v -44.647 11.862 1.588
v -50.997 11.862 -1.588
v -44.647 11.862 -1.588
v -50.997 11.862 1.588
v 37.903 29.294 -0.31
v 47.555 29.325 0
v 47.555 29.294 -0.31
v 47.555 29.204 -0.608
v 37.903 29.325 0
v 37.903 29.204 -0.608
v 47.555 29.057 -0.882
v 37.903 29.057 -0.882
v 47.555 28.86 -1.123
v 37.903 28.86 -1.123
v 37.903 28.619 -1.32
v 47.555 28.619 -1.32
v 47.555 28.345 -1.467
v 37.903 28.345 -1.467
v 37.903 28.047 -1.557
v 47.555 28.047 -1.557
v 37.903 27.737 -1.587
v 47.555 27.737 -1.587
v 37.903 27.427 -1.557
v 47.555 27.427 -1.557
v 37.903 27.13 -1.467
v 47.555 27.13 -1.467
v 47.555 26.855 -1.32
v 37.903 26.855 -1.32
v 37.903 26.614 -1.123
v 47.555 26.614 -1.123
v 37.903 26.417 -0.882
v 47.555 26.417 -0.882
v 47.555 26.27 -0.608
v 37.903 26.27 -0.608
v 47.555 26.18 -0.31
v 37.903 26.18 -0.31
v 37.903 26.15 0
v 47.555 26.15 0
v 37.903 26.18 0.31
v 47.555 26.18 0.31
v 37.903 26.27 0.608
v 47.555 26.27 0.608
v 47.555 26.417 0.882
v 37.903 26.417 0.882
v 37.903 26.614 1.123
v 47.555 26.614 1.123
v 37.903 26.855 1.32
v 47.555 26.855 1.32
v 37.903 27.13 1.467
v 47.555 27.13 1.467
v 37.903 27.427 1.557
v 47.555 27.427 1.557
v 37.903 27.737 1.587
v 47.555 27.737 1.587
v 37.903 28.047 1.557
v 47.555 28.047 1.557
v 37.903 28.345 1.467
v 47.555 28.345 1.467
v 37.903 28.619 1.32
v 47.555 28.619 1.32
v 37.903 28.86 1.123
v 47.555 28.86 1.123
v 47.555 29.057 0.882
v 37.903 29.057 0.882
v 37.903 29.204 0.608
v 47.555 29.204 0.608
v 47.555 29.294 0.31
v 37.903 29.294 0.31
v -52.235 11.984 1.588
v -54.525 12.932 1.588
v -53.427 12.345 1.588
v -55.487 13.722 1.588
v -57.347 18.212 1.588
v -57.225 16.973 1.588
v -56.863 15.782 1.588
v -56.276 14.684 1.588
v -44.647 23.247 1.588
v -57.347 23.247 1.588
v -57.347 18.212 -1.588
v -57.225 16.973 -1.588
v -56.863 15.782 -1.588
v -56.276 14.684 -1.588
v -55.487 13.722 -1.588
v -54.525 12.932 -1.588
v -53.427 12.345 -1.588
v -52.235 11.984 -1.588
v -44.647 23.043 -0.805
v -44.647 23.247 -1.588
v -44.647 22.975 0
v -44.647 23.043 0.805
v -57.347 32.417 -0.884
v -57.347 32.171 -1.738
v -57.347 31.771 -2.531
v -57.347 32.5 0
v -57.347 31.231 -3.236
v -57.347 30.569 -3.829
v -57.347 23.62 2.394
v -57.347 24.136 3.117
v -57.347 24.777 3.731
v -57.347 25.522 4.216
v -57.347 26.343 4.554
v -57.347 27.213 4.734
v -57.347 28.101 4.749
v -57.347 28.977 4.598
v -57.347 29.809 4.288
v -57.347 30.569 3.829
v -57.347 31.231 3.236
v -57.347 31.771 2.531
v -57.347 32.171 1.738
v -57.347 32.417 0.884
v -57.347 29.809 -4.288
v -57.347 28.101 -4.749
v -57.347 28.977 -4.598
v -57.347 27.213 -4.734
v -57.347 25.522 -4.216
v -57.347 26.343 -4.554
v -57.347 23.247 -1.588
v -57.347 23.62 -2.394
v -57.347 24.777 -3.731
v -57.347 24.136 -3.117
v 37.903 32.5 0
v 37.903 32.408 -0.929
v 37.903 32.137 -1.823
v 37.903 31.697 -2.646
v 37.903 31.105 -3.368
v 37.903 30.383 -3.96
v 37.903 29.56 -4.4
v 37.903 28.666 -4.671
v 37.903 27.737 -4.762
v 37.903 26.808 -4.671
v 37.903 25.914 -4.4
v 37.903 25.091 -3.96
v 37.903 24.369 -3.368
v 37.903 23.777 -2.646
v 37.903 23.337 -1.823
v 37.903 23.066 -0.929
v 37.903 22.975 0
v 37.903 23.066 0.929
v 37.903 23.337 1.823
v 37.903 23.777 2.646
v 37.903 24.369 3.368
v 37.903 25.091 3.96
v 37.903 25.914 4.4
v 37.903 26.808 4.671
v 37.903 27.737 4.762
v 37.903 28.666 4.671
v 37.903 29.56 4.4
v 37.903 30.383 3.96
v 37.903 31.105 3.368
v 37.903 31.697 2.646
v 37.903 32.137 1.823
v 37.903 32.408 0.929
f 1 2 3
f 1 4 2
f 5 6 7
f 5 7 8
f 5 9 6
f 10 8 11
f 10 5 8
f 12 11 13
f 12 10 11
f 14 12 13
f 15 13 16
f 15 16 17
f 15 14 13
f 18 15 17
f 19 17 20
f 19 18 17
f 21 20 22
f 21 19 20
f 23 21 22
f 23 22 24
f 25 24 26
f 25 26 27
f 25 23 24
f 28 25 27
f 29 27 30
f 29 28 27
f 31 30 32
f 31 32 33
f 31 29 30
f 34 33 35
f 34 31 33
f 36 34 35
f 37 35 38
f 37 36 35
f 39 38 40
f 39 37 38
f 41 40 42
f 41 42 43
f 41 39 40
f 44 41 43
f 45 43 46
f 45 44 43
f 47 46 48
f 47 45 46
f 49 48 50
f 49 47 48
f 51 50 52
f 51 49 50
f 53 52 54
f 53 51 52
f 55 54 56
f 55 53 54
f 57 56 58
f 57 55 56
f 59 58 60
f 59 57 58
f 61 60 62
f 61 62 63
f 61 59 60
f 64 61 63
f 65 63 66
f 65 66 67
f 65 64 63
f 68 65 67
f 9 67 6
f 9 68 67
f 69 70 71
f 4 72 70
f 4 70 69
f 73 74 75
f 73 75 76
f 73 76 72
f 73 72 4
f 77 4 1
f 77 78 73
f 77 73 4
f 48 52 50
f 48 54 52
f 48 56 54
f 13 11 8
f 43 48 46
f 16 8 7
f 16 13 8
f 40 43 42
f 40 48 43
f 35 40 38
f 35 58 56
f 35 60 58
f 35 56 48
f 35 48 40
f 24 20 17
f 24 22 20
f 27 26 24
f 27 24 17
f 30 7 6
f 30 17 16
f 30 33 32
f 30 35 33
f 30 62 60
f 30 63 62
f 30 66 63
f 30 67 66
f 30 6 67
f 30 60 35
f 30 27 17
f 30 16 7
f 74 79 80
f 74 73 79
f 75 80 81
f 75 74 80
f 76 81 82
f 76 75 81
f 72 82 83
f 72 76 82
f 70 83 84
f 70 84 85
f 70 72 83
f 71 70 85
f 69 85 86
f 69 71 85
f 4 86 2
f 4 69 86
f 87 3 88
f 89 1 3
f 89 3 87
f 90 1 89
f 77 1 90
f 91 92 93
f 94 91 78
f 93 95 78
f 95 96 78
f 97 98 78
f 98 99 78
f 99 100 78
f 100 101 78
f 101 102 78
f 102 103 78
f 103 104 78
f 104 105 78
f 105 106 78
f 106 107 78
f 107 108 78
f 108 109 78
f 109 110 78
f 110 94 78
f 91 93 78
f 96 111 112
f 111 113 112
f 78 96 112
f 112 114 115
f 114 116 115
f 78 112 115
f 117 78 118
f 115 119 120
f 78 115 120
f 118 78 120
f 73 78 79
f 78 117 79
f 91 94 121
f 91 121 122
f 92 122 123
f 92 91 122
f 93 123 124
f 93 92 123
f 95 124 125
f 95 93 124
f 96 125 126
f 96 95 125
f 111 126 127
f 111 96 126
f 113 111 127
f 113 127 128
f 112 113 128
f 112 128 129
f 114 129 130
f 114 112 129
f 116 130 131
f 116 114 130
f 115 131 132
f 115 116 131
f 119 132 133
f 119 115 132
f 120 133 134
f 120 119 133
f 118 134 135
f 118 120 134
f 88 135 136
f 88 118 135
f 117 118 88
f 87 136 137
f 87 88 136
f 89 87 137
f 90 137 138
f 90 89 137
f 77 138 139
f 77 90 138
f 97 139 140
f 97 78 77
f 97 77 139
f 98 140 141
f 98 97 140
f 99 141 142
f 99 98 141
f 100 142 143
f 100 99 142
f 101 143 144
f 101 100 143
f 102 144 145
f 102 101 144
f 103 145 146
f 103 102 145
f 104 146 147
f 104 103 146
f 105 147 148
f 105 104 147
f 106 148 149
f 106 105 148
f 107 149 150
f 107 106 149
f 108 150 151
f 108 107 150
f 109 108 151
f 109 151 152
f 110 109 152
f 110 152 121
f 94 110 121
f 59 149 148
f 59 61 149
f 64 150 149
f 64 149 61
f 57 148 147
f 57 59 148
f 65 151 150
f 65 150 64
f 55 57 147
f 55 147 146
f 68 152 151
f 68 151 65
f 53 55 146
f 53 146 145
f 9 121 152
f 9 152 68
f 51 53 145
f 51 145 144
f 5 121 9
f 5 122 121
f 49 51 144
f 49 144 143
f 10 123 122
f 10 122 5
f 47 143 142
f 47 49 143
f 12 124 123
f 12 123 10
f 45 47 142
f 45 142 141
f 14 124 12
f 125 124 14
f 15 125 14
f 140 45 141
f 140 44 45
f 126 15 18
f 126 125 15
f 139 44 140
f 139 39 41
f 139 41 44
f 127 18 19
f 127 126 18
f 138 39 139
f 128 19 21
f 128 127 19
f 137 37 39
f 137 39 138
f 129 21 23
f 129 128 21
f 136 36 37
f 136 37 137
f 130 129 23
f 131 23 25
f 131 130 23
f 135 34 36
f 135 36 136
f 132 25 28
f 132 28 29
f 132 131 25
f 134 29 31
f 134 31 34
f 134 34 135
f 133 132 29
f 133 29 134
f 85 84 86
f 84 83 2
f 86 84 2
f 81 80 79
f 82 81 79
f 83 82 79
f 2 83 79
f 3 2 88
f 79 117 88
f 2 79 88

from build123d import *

# Parameters (mm, degrees)
F0_W     = 12.7
F0_H     = 4.7625
F2_DEPTH = 1.5875
F3_R     = 6.35


with BuildPart() as f1:
    # F0 (on Top) → F1 (revolve)
    with BuildSketch(Plane.XY):
        with Locations((-50.996662, 30.11827)):
            Rectangle(F0_W, F0_H)
        Polygon((37.903338, 32.49952), (-44.646662, 32.49952), (-44.646662, 27.73702), (47.555338, 27.73702), (47.555338, 29.32452), (37.903338, 29.32452), align=None)
    revolve(axis=Axis((1.454338, 27.73702, 0), (-1, 0, 0)))

    # F0 (on Top) → F2 (join, symmetric)
    with BuildSketch(Plane.XY):
        Polygon((-44.646662, 22.97452), (-44.646662, 27.73702), (-57.346662, 27.73702), (-57.346662, 11.86202), (-44.646662, 11.86202), align=None)
    extrude(amount=F2_DEPTH, both=True)

    # F3
    f3_edges = [f1.edges().sort_by_distance(p)[0] for p in [
        (-57.346662, 11.86202, 0),
    ]]
    fillet(f3_edges, radius=F3_R)


solid = f1.part
